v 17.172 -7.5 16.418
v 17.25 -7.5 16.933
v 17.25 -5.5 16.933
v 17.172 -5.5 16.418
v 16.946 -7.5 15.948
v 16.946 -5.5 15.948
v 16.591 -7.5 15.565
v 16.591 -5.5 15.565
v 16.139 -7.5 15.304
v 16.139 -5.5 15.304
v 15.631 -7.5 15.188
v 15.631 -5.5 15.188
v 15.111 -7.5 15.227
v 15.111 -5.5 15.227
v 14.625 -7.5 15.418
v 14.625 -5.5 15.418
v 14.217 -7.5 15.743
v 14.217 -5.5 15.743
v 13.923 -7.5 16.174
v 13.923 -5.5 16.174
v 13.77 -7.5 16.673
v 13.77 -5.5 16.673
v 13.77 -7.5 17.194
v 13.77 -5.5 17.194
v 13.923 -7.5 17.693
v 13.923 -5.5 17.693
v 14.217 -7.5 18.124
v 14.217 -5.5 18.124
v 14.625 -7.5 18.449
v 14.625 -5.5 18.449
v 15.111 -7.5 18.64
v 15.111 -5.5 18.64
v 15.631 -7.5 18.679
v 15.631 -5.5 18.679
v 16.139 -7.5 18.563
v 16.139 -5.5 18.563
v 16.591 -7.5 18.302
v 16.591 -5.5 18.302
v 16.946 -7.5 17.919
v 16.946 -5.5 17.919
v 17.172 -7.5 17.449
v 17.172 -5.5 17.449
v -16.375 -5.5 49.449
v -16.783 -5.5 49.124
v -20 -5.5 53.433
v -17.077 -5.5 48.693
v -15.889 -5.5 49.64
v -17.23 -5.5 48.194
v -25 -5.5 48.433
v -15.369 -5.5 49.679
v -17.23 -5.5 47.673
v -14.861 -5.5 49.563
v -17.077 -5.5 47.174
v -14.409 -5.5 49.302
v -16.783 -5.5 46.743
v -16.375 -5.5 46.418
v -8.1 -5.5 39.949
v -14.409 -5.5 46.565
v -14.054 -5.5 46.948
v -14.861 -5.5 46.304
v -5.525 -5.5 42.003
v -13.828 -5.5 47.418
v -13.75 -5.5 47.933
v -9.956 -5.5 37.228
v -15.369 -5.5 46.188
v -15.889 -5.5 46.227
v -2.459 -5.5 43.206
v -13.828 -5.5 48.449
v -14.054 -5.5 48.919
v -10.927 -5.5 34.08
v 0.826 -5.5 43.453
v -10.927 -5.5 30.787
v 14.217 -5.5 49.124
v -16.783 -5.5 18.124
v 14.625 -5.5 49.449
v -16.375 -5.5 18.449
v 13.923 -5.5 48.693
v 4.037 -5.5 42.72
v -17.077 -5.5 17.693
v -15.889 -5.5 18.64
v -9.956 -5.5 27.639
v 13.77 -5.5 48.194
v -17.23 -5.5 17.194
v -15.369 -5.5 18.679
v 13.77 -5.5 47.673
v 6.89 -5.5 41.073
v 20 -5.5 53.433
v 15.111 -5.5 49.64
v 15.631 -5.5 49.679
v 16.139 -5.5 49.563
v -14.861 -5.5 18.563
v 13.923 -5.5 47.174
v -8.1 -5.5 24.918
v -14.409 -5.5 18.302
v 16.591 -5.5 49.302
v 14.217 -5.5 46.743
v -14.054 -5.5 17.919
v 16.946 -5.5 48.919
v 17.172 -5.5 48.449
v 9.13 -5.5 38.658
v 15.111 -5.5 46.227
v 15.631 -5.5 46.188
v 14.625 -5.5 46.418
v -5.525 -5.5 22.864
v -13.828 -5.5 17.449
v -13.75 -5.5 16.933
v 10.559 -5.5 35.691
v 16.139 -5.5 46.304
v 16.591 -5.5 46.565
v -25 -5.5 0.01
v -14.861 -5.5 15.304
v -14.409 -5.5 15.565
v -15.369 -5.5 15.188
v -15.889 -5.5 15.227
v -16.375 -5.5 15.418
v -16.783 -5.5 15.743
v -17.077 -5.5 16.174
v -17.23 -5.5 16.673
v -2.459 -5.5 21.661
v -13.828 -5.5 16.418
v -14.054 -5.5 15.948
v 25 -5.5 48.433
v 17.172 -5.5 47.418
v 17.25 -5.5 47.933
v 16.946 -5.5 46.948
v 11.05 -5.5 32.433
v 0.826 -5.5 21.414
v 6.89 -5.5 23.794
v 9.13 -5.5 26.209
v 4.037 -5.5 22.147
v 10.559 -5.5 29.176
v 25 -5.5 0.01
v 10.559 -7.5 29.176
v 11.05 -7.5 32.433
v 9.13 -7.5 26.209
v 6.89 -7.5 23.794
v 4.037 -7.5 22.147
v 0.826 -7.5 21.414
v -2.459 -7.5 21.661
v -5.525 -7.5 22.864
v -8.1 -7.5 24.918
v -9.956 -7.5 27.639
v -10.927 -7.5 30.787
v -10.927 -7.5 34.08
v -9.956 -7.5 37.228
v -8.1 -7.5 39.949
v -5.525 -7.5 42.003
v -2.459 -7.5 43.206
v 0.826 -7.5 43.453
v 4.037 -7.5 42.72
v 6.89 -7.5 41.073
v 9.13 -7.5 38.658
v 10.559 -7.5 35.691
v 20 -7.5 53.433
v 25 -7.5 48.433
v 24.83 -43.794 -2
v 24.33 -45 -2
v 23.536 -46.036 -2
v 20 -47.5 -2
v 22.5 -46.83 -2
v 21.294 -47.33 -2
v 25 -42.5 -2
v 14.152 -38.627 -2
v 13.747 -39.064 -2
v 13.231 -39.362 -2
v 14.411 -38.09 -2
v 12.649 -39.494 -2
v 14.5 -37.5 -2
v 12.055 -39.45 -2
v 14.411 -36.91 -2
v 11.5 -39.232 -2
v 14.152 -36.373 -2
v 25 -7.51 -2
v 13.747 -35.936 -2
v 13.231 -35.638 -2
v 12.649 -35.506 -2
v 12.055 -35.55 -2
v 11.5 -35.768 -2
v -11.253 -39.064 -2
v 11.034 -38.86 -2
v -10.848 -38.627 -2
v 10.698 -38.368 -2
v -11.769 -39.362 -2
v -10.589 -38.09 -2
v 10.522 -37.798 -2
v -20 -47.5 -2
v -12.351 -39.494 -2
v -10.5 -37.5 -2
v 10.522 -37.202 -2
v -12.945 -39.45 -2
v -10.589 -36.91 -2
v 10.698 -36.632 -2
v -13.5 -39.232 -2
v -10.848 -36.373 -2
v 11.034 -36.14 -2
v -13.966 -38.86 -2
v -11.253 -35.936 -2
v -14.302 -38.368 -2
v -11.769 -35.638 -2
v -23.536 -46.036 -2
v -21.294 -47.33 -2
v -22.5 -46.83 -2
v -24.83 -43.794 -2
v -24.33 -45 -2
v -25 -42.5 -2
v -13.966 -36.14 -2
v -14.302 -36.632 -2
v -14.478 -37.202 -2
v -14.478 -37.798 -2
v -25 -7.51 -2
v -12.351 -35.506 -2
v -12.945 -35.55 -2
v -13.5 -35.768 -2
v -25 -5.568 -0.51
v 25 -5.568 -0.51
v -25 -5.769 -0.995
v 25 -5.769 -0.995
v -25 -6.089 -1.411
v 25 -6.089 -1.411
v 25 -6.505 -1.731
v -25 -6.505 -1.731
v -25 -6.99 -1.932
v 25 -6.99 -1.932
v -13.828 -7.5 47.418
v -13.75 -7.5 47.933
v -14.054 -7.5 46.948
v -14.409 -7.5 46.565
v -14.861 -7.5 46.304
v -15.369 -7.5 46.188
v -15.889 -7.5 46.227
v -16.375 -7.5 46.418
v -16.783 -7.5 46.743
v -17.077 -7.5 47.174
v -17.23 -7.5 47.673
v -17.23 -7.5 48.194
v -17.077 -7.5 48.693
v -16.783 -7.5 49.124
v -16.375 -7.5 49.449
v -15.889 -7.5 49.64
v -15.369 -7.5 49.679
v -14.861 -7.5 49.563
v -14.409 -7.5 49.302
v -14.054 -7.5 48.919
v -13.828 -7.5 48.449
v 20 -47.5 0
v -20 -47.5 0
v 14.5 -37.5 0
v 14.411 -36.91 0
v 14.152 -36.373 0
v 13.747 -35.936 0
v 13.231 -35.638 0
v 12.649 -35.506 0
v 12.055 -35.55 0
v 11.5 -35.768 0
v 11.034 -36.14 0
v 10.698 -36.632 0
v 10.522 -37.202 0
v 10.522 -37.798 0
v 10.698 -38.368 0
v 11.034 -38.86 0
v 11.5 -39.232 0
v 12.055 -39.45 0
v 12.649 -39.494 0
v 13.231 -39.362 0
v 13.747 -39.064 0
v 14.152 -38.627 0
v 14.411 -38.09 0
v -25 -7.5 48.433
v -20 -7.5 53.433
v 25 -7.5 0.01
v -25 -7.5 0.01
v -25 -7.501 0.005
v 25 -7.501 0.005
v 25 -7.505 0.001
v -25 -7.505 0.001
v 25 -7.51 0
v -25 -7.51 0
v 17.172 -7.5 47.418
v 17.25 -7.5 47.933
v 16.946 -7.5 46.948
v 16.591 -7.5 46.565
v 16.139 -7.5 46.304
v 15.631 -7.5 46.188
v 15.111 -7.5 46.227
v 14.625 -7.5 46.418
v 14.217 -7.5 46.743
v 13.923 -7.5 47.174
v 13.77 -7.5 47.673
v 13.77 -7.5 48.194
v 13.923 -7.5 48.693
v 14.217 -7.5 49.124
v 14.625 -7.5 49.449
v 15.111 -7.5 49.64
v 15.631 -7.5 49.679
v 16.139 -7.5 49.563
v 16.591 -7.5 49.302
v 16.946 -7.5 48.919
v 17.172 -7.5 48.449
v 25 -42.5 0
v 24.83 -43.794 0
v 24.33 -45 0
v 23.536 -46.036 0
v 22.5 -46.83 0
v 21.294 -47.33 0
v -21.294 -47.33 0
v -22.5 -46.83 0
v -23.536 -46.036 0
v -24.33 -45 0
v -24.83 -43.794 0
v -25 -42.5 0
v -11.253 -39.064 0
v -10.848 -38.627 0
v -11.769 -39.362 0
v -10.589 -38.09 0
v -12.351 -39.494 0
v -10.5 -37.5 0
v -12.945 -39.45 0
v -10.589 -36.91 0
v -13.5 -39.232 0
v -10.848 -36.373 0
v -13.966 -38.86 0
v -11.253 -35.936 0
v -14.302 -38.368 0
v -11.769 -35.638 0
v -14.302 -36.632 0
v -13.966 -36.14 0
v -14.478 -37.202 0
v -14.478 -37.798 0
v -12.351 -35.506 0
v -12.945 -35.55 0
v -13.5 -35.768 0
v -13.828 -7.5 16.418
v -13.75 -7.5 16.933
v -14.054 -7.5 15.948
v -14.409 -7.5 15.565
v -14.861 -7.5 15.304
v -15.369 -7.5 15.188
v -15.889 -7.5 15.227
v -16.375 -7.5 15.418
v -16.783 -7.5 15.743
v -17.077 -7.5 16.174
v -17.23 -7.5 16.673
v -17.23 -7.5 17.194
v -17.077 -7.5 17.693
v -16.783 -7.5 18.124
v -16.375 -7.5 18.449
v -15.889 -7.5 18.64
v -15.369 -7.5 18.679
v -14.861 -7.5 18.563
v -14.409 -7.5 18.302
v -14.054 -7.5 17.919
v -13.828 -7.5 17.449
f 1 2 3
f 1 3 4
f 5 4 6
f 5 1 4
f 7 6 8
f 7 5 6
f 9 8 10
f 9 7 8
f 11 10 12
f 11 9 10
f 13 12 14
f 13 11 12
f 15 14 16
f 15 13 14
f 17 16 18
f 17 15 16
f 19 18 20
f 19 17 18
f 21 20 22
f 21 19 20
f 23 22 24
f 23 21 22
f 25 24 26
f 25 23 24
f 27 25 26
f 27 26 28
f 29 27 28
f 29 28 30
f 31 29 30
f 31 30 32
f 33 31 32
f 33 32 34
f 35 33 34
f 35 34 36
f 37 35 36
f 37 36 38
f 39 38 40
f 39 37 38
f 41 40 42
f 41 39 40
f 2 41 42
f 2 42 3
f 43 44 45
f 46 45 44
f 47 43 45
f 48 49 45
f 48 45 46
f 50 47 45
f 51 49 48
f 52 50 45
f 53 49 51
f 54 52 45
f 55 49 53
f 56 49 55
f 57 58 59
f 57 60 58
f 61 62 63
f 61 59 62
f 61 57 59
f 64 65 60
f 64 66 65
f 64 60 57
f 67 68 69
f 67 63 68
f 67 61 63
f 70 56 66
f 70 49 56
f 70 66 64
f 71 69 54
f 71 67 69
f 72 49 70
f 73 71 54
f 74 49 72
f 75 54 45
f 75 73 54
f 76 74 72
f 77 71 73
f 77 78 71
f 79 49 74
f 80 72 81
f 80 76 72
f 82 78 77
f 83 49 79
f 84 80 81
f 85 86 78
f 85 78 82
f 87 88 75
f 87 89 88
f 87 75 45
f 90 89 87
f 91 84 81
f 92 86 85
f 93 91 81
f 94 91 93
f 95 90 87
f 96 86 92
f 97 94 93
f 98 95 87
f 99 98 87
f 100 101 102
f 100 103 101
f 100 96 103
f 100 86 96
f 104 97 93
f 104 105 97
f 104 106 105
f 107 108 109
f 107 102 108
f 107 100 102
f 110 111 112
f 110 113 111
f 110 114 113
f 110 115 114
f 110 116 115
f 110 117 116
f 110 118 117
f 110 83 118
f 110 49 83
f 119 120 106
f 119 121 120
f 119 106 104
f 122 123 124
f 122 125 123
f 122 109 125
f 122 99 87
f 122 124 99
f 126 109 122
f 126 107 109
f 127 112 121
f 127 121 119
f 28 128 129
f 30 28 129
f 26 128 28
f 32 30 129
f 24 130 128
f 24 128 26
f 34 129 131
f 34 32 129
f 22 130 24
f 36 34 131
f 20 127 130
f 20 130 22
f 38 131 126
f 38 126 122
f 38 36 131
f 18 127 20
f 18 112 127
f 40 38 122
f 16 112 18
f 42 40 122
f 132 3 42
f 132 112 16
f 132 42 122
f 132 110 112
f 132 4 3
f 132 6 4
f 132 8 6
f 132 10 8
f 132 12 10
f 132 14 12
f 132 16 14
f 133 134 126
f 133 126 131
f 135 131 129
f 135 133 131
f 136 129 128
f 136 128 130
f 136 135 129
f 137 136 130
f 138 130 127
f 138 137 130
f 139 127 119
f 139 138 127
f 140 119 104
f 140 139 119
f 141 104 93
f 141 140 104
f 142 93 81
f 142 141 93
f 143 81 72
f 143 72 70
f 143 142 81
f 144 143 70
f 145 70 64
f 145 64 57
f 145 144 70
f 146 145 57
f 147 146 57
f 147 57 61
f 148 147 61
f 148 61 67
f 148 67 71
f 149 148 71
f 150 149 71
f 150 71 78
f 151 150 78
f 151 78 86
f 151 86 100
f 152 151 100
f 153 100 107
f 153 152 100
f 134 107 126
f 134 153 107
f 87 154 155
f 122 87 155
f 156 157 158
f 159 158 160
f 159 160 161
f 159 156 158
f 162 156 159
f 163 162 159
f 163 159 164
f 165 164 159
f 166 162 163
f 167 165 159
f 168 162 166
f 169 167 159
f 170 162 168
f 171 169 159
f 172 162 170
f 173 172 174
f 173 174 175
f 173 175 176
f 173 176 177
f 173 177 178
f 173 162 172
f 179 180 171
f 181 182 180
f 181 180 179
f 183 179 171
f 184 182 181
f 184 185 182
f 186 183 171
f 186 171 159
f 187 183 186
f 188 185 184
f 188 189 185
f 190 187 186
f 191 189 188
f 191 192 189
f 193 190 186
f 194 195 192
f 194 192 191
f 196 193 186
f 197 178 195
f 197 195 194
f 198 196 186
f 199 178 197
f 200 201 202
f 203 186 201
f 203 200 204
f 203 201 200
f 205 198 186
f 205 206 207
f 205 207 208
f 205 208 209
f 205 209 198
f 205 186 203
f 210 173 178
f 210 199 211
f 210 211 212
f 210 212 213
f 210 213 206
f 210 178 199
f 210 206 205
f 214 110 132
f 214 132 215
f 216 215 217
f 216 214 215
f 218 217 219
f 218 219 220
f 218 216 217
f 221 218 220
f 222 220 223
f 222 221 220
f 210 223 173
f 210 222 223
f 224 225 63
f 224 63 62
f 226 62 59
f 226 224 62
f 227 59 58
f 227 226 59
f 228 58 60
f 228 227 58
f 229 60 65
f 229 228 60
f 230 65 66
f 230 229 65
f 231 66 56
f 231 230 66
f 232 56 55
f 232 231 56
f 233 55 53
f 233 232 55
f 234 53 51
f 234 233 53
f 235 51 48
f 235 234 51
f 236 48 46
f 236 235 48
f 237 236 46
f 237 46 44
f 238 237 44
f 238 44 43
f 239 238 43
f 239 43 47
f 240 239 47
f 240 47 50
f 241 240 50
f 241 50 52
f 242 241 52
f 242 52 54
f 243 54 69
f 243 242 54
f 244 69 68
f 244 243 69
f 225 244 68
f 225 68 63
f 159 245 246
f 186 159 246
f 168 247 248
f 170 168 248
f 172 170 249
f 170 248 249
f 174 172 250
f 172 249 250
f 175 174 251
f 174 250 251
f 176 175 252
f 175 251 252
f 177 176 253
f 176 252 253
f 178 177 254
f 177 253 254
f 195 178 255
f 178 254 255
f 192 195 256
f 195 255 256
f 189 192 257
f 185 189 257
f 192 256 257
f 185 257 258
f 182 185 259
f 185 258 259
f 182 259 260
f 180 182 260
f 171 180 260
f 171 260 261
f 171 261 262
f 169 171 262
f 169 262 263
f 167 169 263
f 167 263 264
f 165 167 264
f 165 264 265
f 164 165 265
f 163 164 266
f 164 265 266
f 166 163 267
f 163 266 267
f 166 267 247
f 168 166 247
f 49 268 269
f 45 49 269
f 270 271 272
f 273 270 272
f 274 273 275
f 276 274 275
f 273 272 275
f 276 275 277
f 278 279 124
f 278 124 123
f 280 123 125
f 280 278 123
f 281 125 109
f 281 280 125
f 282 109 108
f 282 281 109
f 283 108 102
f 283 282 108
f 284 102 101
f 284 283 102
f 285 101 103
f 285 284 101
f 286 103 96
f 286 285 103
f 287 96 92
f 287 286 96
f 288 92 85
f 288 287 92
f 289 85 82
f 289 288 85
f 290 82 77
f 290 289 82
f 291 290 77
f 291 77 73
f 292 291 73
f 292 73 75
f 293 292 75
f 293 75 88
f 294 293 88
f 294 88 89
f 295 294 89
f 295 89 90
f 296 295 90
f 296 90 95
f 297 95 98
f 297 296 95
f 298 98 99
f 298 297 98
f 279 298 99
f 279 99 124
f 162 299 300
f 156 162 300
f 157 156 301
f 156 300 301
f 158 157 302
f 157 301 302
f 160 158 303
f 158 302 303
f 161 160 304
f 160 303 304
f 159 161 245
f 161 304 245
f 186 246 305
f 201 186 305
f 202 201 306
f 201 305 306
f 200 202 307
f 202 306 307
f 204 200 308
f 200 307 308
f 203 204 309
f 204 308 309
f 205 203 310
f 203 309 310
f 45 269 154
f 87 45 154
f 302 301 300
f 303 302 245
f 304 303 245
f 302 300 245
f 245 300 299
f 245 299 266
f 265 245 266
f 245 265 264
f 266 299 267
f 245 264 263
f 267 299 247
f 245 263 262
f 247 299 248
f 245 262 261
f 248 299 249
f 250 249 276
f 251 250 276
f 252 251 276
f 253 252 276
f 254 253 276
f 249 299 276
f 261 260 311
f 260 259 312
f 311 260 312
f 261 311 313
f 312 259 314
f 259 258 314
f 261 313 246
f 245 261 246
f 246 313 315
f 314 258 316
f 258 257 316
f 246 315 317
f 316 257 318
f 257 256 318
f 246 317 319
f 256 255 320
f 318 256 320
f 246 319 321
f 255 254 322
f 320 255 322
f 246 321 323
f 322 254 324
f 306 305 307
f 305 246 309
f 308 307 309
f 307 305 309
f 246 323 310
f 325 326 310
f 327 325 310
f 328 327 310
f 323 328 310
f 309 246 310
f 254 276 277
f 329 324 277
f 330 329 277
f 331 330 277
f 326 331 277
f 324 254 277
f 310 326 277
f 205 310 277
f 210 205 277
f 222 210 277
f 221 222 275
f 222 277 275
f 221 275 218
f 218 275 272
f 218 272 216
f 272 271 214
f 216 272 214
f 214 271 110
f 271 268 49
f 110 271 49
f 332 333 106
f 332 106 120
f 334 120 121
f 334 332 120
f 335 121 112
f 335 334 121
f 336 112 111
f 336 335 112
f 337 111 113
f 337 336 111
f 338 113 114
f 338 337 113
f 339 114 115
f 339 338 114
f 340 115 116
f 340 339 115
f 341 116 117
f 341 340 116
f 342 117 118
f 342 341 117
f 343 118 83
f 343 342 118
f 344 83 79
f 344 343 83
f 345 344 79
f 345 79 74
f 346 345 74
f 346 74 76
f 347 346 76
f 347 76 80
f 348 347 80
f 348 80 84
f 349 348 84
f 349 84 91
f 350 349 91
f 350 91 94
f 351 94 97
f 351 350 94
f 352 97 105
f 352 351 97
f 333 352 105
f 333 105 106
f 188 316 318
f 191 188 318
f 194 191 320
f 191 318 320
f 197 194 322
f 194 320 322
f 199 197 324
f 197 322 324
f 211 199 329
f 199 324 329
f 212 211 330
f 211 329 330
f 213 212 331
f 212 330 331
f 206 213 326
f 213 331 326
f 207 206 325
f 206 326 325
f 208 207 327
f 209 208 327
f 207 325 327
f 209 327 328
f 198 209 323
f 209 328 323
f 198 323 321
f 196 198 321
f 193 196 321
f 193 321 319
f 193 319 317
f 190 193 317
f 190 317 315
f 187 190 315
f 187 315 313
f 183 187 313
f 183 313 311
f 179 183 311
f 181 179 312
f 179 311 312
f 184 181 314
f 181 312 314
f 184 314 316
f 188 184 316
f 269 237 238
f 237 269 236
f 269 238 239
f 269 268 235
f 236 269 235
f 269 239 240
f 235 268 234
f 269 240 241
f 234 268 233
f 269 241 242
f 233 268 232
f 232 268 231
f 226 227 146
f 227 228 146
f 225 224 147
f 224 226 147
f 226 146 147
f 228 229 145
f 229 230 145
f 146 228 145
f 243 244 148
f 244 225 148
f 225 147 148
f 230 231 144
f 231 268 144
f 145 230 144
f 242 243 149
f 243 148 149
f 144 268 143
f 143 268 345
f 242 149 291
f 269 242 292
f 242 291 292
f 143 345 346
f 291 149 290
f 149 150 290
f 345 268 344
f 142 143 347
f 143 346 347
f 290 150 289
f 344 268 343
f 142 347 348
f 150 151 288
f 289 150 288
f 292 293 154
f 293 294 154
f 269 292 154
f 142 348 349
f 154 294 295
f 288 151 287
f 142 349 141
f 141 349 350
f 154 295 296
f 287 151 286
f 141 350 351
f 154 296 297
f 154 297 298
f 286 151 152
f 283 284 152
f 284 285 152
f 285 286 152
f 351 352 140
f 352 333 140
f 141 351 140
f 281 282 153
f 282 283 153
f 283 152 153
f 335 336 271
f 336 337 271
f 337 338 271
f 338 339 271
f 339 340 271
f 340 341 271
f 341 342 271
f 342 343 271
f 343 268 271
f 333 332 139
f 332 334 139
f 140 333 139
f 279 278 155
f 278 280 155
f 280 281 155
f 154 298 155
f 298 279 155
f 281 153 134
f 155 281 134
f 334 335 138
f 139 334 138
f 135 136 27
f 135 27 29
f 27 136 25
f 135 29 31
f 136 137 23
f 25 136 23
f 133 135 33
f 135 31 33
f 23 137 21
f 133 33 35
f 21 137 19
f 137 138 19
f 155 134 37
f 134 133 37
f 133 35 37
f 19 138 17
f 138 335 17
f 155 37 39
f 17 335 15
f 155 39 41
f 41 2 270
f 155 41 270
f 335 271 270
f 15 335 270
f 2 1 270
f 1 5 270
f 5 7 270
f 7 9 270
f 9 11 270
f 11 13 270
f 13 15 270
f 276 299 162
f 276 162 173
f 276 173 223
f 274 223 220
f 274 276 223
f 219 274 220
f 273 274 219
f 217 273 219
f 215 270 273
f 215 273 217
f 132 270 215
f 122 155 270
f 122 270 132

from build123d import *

# Parameters (mm, degrees)
SCHIZZO1_R                             = 1.75
SCHIZZO1_R_2                           = 11.05
SCHIZZO1_R_3                           = 2
BASE_FLANGIA1_DEPTH                    = 2
PIEGATURA_START                        = -5.5
PIEGATURA_DELLO_SCHIZZO1_OUTLINE_W     = 50
PIEGATURA_DELLO_SCHIZZO1_OUTLINE_H     = 2
PIEGATURA_DELLO_SCHIZZO1_DEPTH         = 53
PIEGATURA_START_2                      = -7.5
PIEGATURA_DELLO_SCHIZZO1_2_OUTLINE_R   = 1.75
PIEGATURA_DELLO_SCHIZZO1_2_OUTLINE_R_2 = 11.05
PIEGATURA_DELLO_SCHIZZO1_2_DEPTH       = 2
PIEGATURA_START_3                      = -26
PIEGATURA_DELLO_SCHIZZO1_3_DEPTH       = 52
PIEGATURA_START_4                      = -25
PIEGATURA_DELLO_SCHIZZO1_4_DEPTH       = 50


with BuildPart() as part:
    # Base-Flangia1: sheet metal written as solids
    # Schizzo1 → Base-Flangia1 (new body)
    with BuildSketch(Plane.XY):
        with BuildLine():
            Line((-25, 42.5), (-20, 47.5))
            Line((-20, 47.5), (20, 47.5))
            Line((20, 47.5), (25, 42.5))
            Line((25, 42.5), (25, -42.5))
            ThreePointArc((25, -42.5), (23.535533906, -46.035533906), (20, -47.5))
            Line((20, -47.5), (-20, -47.5))
            ThreePointArc((-20, -47.5), (-23.535533906, -46.035533906), (-25, -42.5))
            Line((-25, -42.5), (-25, 42.5))
        make_face()
        with Locations((-15.5, 42)):
            Circle(SCHIZZO1_R, mode=Mode.SUBTRACT)
        with Locations((15.5, 42)):
            Circle(SCHIZZO1_R, mode=Mode.SUBTRACT)
        with Locations((15.5, 11)):
            Circle(SCHIZZO1_R, mode=Mode.SUBTRACT)
        with Locations((-15.5, 11)):
            Circle(SCHIZZO1_R, mode=Mode.SUBTRACT)
        with Locations((0, 26.5)):
            Circle(SCHIZZO1_R_2, mode=Mode.SUBTRACT)
        with Locations((-12.5, -37.5)):
            Circle(SCHIZZO1_R_3, mode=Mode.SUBTRACT)
        with Locations((12.5, -37.5)):
            Circle(SCHIZZO1_R_3, mode=Mode.SUBTRACT)
    extrude(amount=-BASE_FLANGIA1_DEPTH)

    # Piegatura dello schizzo1: read off the stored shape, not the designer's step
    # Piegatura dello schizzo1 outline → Piegatura dello schizzo1 (cut)
    with BuildSketch(Plane(origin=(0, 0, 0), x_dir=(1, 0, 0), z_dir=(0, 1, 0)).offset(PIEGATURA_START)):
        with Locations((0, 1)):
            Rectangle(PIEGATURA_DELLO_SCHIZZO1_OUTLINE_W, PIEGATURA_DELLO_SCHIZZO1_OUTLINE_H)
    extrude(amount=PIEGATURA_DELLO_SCHIZZO1_DEPTH, mode=Mode.SUBTRACT)

    # Piegatura dello schizzo1 2 outline → Piegatura dello schizzo1 2 (add)
    with BuildSketch(Plane(origin=(0, 0, 0), x_dir=(1, 0, 0), z_dir=(0, 1, 0)).offset(PIEGATURA_START_2)):
        Polygon((-25, 0), (-25, -48.43349571), (-20, -53.43349571), (20, -53.43349571), (25, -48.43349571), (25, 0), align=None)
        with Locations((-15.5, -47.93349571)):
            Circle(PIEGATURA_DELLO_SCHIZZO1_2_OUTLINE_R, mode=Mode.SUBTRACT)
        with Locations((15.5, -47.93349571)):
            Circle(PIEGATURA_DELLO_SCHIZZO1_2_OUTLINE_R, mode=Mode.SUBTRACT)
        with Locations((0, -32.43349571)):
            Circle(PIEGATURA_DELLO_SCHIZZO1_2_OUTLINE_R_2, mode=Mode.SUBTRACT)
        with Locations((-15.5, -16.93349571)):
            Circle(PIEGATURA_DELLO_SCHIZZO1_2_OUTLINE_R, mode=Mode.SUBTRACT)
        with Locations((15.5, -16.93349571)):
            Circle(PIEGATURA_DELLO_SCHIZZO1_2_OUTLINE_R, mode=Mode.SUBTRACT)
    extrude(amount=PIEGATURA_DELLO_SCHIZZO1_2_DEPTH)

    # Piegatura dello schizzo1 3 outline → Piegatura dello schizzo1 3 (cut)
    with BuildSketch(Plane.YZ.offset(PIEGATURA_START_3)):
        with BuildLine():
            ThreePointArc((-5.5, 0.01), (-6.08871537, -1.41128463), (-7.51, -2))
            Line((-7.51, -2), (-5.5, -2))
            Line((-5.5, -2), (-5.5, 0.01))
        make_face()
    extrude(amount=PIEGATURA_DELLO_SCHIZZO1_3_DEPTH, mode=Mode.SUBTRACT)

    # Piegatura dello schizzo1 4 outline → Piegatura dello schizzo1 4 (add)
    with BuildSketch(Plane.YZ.offset(PIEGATURA_START_4)):
        with BuildLine():
            ThreePointArc((-7.5, 0.01), (-7.502928932, 0.002928932), (-7.51, 0))
            Line((-7.51, 0), (-7.5, 0))
            Line((-7.5, 0), (-7.5, 0.01))
        make_face()
    extrude(amount=PIEGATURA_DELLO_SCHIZZO1_4_DEPTH)


solid = part.part
